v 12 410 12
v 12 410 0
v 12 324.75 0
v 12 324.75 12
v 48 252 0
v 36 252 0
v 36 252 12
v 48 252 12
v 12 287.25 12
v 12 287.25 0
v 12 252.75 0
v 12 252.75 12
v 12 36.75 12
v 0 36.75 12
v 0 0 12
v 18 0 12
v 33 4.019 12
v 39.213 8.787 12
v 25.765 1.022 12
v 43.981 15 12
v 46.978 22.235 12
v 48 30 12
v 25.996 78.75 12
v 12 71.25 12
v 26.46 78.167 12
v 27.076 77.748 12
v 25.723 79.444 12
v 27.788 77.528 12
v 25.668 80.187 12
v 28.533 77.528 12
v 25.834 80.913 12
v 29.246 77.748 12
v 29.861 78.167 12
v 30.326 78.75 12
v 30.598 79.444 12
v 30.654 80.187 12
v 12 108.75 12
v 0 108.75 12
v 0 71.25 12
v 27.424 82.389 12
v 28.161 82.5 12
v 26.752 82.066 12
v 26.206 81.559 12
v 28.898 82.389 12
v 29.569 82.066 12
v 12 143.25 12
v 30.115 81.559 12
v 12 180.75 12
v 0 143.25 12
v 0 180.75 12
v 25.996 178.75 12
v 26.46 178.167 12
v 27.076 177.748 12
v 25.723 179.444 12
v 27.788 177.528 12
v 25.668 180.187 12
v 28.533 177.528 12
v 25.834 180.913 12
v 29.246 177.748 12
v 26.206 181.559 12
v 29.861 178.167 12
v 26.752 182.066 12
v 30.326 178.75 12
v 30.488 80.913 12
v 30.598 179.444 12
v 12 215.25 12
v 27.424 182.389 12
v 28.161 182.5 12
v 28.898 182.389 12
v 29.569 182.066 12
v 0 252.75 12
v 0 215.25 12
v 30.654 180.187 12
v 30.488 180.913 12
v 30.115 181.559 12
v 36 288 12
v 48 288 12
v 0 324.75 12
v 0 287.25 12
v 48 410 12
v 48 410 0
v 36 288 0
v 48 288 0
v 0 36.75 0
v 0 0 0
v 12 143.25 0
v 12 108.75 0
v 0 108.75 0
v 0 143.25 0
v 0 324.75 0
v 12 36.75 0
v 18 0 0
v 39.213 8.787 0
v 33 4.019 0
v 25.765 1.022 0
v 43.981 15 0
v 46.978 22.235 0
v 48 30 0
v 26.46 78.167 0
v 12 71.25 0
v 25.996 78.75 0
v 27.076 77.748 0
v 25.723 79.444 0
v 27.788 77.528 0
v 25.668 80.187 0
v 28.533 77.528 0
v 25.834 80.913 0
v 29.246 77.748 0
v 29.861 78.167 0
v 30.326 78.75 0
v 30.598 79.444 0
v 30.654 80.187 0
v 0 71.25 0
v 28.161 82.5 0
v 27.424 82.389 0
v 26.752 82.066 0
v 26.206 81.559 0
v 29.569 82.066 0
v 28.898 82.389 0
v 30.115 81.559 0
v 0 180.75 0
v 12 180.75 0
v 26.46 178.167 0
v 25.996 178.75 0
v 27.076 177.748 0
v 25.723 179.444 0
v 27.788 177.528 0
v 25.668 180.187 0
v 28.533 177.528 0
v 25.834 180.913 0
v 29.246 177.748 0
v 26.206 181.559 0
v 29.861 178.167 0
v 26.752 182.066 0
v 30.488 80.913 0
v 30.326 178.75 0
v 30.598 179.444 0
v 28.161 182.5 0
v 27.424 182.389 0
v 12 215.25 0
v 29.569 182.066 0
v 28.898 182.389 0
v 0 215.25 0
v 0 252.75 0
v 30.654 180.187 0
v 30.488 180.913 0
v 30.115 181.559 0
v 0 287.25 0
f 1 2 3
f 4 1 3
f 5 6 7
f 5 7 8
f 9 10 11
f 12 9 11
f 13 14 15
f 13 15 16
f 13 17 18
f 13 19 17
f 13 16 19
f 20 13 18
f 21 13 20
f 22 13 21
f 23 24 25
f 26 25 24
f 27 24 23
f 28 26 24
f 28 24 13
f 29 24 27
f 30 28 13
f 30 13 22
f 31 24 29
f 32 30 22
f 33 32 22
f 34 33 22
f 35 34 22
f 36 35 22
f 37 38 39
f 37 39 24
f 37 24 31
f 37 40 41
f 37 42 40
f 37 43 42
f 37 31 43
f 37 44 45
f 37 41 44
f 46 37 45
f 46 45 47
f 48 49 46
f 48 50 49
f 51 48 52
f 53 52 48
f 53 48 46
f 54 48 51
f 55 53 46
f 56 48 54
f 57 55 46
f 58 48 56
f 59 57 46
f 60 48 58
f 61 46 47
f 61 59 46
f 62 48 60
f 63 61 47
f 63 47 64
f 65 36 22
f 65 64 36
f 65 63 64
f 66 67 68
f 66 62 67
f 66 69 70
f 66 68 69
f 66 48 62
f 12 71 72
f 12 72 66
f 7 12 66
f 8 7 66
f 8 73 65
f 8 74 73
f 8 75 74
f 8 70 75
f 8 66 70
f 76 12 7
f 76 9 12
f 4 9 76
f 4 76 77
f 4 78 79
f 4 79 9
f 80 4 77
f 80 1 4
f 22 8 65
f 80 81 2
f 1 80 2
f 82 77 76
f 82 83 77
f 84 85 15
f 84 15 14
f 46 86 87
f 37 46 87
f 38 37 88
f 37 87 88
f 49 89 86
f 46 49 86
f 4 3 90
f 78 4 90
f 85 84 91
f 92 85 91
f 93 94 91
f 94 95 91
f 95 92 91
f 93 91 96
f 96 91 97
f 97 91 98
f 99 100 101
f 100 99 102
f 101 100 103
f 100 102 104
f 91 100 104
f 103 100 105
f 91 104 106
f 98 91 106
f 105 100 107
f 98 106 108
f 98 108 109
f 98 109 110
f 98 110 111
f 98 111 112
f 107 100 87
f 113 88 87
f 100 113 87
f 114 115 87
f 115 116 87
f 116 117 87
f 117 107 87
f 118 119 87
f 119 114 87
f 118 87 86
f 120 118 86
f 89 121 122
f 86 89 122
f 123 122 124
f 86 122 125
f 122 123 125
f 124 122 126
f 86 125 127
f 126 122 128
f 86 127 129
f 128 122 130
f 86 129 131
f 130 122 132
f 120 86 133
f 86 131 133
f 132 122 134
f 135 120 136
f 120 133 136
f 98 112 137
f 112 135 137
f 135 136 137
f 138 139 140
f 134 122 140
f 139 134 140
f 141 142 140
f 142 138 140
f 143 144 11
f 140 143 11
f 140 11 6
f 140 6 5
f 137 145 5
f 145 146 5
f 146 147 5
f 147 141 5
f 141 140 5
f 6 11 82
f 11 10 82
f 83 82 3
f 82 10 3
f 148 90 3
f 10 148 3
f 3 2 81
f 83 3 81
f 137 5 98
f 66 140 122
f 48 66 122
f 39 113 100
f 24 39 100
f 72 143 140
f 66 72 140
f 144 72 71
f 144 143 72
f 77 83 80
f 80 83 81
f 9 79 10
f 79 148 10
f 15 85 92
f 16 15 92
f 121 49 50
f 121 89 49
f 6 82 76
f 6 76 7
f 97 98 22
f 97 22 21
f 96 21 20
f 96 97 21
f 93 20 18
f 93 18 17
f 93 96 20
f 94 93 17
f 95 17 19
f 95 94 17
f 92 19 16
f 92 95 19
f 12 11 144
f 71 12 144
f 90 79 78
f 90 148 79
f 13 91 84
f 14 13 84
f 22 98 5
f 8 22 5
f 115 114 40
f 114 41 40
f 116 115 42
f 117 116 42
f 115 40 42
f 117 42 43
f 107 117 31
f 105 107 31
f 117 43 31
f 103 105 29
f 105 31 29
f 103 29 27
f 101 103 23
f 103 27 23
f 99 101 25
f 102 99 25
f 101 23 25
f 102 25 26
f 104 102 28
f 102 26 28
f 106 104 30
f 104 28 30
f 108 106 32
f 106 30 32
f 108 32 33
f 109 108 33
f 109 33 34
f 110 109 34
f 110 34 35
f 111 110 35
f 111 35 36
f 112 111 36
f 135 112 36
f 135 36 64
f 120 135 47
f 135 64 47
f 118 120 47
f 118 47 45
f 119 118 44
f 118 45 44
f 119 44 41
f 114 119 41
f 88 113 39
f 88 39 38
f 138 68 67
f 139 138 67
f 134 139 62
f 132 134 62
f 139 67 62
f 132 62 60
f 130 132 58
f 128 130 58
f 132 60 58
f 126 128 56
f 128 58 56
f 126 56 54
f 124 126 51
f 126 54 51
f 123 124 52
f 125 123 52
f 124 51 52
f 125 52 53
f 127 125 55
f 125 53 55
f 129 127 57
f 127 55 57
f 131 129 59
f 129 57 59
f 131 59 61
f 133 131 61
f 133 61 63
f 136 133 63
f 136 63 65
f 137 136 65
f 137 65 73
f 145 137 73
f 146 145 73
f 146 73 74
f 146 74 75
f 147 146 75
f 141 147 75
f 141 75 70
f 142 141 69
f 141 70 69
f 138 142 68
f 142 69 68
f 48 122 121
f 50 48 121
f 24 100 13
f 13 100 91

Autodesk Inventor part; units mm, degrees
ref_plane "YZ Plane" through (0, 0, 0) normal (1, 0, 0) x (0, 1, 0)
ref_plane "XZ Plane" through (0, 0, 0) normal (0, 1, 0) x (-1, 0, 0)
ref_plane "XY Plane" through (0, 0, 0) normal (0, 0, 1) x (1, 0, 0)
ref_plane "Work Plane1" through (0, 0, 0) normal (0, 0, 1) x (1, 0, 0)
sketch "Sketch1" plane through (0, 0, 0) normal (0, 0, 1) x (1, 0, 0)
  line L0 (12, 534.827) -> (0, 534.827)
  line L1 (0, 534.827) -> (0, 622.3733)
  line L2 (0, 622.3733) -> (12, 622.3733)
  line L3 (12, 622.3733) -> (12, 534.827)
  line L4 (0, 476.4832) -> (12, 476.4832)
  line L5 (12, 476.4832) -> (12, 324)
  line L6 (12, 324) -> (0, 324)
  line L7 (0, 288) -> (0, 324)
  line L8 (0, 288) -> (12, 288)
  line L9 (12, 288) -> (12, 252)
  line L10 (12, 252) -> (0, 252)
  line L11 (0, 216) -> (0, 252)
  line L12 (0, 216) -> (12, 216)
  line L13 (12, 216) -> (12, 180)
  line L14 (12, 180) -> (0, 180)
  line L15 (0, 144) -> (0, 180)
  line L16 (0, 144) -> (12, 144)
  line L17 (12, 144) -> (12, 108)
  line L18 (12, 108) -> (0, 108)
  line L19 (0, 72) -> (0, 108)
  line L20 (0, 72) -> (12, 72)
  line L21 (12, 72) -> (12, 36)
  line L22 (12, 36) -> (0, 36)
  line L23 (0, 0) -> (0, 36)
  line L24 (12, 0) -> (0, 0)
  line L25 (12, 36) -> (12, 0)
  line L26 (0, 324) -> (0, 476.4832)
  line L27 (12, 324) -> (12, 288)
  line L28 (0, 252) -> (0, 288)
  line L29 (12, 252) -> (12, 216)
  line L30 (0, 180) -> (0, 216)
  line L31 (12, 180) -> (12, 144)
  line L32 (0, 108) -> (0, 144)
  line L33 (12, 108) -> (12, 72)
  line L34 (0, 36) -> (0, 72)
  line L35 (12, 0) -> (18, 0)
  line L36 (48, 30) -> (48, 410)
  line L37 (48, 410) -> (12, 410)
  line L38 (12, 410) -> (12, 0)
  arc A0 (18, 0) -> (48, 30) centre (18, 30) ccw
  point P0 (48, 0)
  dimension "d0" = 36
  dimension "d1" = 410
  dimension "d34" = 30
extrude "Extrusion1" add sketch "Sketch1" along normal blind 12 contours L6 L27 L8 L7 | L37 L36 A0 L35 L25 L21 L33 L17 L31 L13 L29 L9 L27 L5 | L10 L29 L12 L11 | L14 L31 L16 L15 | L24 L23 L22 L25 | L18 L33 L20 L19
sketch "Sketch2" plane through (0, 481.1893, 141.342) normal (0, -0.8660254, 0.5) x (1, 0, 0)
  line L0 (0, 0) -> (0, 36) projected
  line L1 (0, 0) -> (12, 0) projected
  line L2 (12, 36) -> (12, 0) projected
  line L3 (0, 36) -> (12, 36) projected
  line L4 (0, -72) -> (0, -36) projected
  line L5 (0, -72) -> (12, -72) projected
  line L6 (12, -36) -> (12, -72) projected
  line L7 (0, -36) -> (12, -36) projected
  line L8 (0, -144) -> (0, -108) projected
  line L9 (0, -144) -> (12, -144) projected
  line L10 (12, -108) -> (12, -144) projected
  line L11 (0, -108) -> (12, -108) projected
  line L12 (48, -147.6081) -> (12, -147.6081) projected
  line L13 (12, 36) -> (624, 36)
  line L14 (624, 36) -> (624, -164)
  line L15 (624, -164) -> (12, -164)
  line L16 (12, -164) -> (12, 36)
  line L17 (318, -164) -> (318, 36) construction
  line L18 (636, 0) -> (636, 36)
  line L19 (636, 0) -> (624, 0)
  line L20 (624, 36) -> (624, 0)
  line L21 (636, 36) -> (624, 36)
  line L22 (636, -72) -> (636, -36)
  line L23 (636, -72) -> (624, -72)
  line L24 (624, -36) -> (624, -72)
  line L25 (636, -36) -> (624, -36)
  line L26 (636, -144) -> (636, -108)
  line L27 (636, -144) -> (624, -144)
  line L28 (624, -108) -> (624, -144)
  line L29 (636, -108) -> (624, -108)
  line L30 (588, -147.6081) -> (624, -147.6081)
  line L31 (624, -164) -> (624, 36)
  line L32 (12, 36) -> (48, 36)
  line L33 (48, 36) -> (48, 24)
  line L34 (48, 24) -> (12, 24)
  line L35 (12, 24) -> (12, 36)
  line L36 (84, 24) -> (48, 24)
  line L37 (84, 36) -> (84, 24)
  line L38 (48, 36) -> (84, 36)
  line L39 (48, 24) -> (48, 36)
  line L40 (120, 24) -> (84, 24)
  line L41 (120, 36) -> (120, 24)
  line L42 (84, 36) -> (120, 36)
  line L43 (84, 24) -> (84, 36)
  line L44 (156, 24) -> (120, 24)
  line L45 (156, 36) -> (156, 24)
  line L46 (120, 36) -> (156, 36)
  line L47 (120, 24) -> (120, 36)
  line L48 (192, 24) -> (156, 24)
  line L49 (192, 36) -> (192, 24)
  line L50 (156, 36) -> (192, 36)
  line L51 (156, 24) -> (156, 36)
  line L52 (228, 24) -> (192, 24)
  line L53 (228, 36) -> (228, 24)
  line L54 (192, 36) -> (228, 36)
  line L55 (192, 24) -> (192, 36)
  line L56 (264, 24) -> (228, 24)
  line L57 (264, 36) -> (264, 24)
  line L58 (228, 36) -> (264, 36)
  line L59 (228, 24) -> (228, 36)
  line L60 (300, 24) -> (264, 24)
  line L61 (300, 36) -> (300, 24)
  line L62 (264, 36) -> (300, 36)
  line L63 (264, 24) -> (264, 36)
  line L64 (336, 24) -> (300, 24)
  line L65 (336, 36) -> (336, 24)
  line L66 (300, 36) -> (336, 36)
  line L67 (300, 24) -> (300, 36)
  line L68 (372, 24) -> (336, 24)
  line L69 (372, 36) -> (372, 24)
  line L70 (336, 36) -> (372, 36)
  line L71 (336, 24) -> (336, 36)
  line L72 (408, 24) -> (372, 24)
  line L73 (408, 36) -> (408, 24)
  line L74 (372, 36) -> (408, 36)
  line L75 (372, 24) -> (372, 36)
  line L76 (444, 24) -> (408, 24)
  line L77 (444, 36) -> (444, 24)
  line L78 (408, 36) -> (444, 36)
  line L79 (408, 24) -> (408, 36)
  line L80 (480, 24) -> (444, 24)
  line L81 (480, 36) -> (480, 24)
  line L82 (444, 36) -> (480, 36)
  line L83 (444, 24) -> (444, 36)
  line L84 (516, 24) -> (480, 24)
  line L85 (516, 36) -> (516, 24)
  line L86 (480, 36) -> (516, 36)
  line L87 (480, 24) -> (480, 36)
  line L88 (552, 24) -> (516, 24)
  line L89 (552, 36) -> (552, 24)
  line L90 (516, 36) -> (552, 36)
  line L91 (516, 24) -> (516, 36)
  line L92 (588, 24) -> (552, 24)
  line L93 (588, 36) -> (588, 24)
  line L94 (552, 36) -> (588, 36)
  line L95 (552, 24) -> (552, 36)
  line L96 (624, 24) -> (588, 24)
  line L97 (624, 36) -> (624, 24)
  line L98 (588, 36) -> (624, 36)
  line L99 (588, 24) -> (588, 36)
  line L100 (660, 24) -> (624, 24)
  line L101 (660, 36) -> (660, 24)
  line L102 (624, 36) -> (660, 36)
  line L103 (624, 24) -> (624, 36)
  line L104 (696, 24) -> (660, 24)
  line L105 (696, 36) -> (696, 24)
  line L106 (660, 36) -> (696, 36)
  line L107 (660, 24) -> (660, 36)
  line L108 (732, 24) -> (696, 24)
  line L109 (732, 36) -> (732, 24)
  line L110 (696, 36) -> (732, 36)
  line L111 (696, 24) -> (696, 36)
  line L112 (12, -64) -> (624, -64) construction
  line L113 (12, -164) -> (12, -128)
  line L114 (12, -164) -> (624, -164)
  line L115 (12, -164) -> (48, -164)
  line L116 (48, -164) -> (48, -152)
  line L117 (48, -152) -> (12, -152)
  line L118 (12, -152) -> (12, -164)
  line L119 (84, -152) -> (48, -152)
  line L120 (84, -164) -> (84, -152)
  line L121 (48, -164) -> (84, -164)
  line L122 (48, -152) -> (48, -164)
  line L123 (120, -152) -> (84, -152)
  line L124 (120, -164) -> (120, -152)
  line L125 (84, -164) -> (120, -164)
  line L126 (84, -152) -> (84, -164)
  line L127 (156, -152) -> (120, -152)
  line L128 (156, -164) -> (156, -152)
  line L129 (120, -164) -> (156, -164)
  line L130 (120, -152) -> (120, -164)
  line L131 (192, -152) -> (156, -152)
  line L132 (192, -164) -> (192, -152)
  line L133 (156, -164) -> (192, -164)
  line L134 (156, -152) -> (156, -164)
  line L135 (228, -152) -> (192, -152)
  line L136 (228, -164) -> (228, -152)
  line L137 (192, -164) -> (228, -164)
  line L138 (192, -152) -> (192, -164)
  line L139 (264, -152) -> (228, -152)
  line L140 (264, -164) -> (264, -152)
  line L141 (228, -164) -> (264, -164)
  line L142 (228, -152) -> (228, -164)
  line L143 (300, -152) -> (264, -152)
  line L144 (300, -164) -> (300, -152)
  line L145 (264, -164) -> (300, -164)
  line L146 (264, -152) -> (264, -164)
  line L147 (336, -152) -> (300, -152)
  line L148 (336, -164) -> (336, -152)
  line L149 (300, -164) -> (336, -164)
  line L150 (300, -152) -> (300, -164)
  line L151 (372, -152) -> (336, -152)
  line L152 (372, -164) -> (372, -152)
  line L153 (336, -164) -> (372, -164)
  line L154 (336, -152) -> (336, -164)
  line L155 (408, -152) -> (372, -152)
  line L156 (408, -164) -> (408, -152)
  line L157 (372, -164) -> (408, -164)
  line L158 (372, -152) -> (372, -164)
  line L159 (444, -152) -> (408, -152)
  line L160 (444, -164) -> (444, -152)
  line L161 (408, -164) -> (444, -164)
  line L162 (408, -152) -> (408, -164)
  line L163 (480, -152) -> (444, -152)
  line L164 (480, -164) -> (480, -152)
  line L165 (444, -164) -> (480, -164)
  line L166 (444, -152) -> (444, -164)
  line L167 (516, -152) -> (480, -152)
  line L168 (516, -164) -> (516, -152)
  line L169 (480, -164) -> (516, -164)
  line L170 (480, -152) -> (480, -164)
  line L171 (552, -152) -> (516, -152)
  line L172 (552, -164) -> (552, -152)
  line L173 (516, -164) -> (552, -164)
  line L174 (516, -152) -> (516, -164)
  line L175 (588, -152) -> (552, -152)
  line L176 (588, -164) -> (588, -152)
  line L177 (552, -164) -> (588, -164)
  line L178 (552, -152) -> (552, -164)
  line L179 (624, -152) -> (588, -152)
  line L180 (624, -164) -> (624, -152)
  line L181 (588, -164) -> (624, -164)
  line L182 (588, -152) -> (588, -164)
  line L183 (624, -152) -> (624, -164)
  circle A0 centre (318, -64) radius 2.5
  circle A1 centre (218, -64) radius 2.5
  circle A2 centre (118, -64) radius 2.5
  line L184 (624, -64) -> (12, -64) construction
  circle A3 centre (318, -64) radius 2.5
  circle A4 centre (418, -64) radius 2.5
  circle A5 centre (518, -64) radius 2.5
  circle A6 centre (168, -14) radius 2.5
  circle A7 centre (268, -14) radius 2.5
  circle A8 centre (468, -14) radius 2.5
  circle A9 centre (368, -14) radius 2.5
  line L185 (318, 36) -> (318, -164) construction
  circle A10 centre (168, -114) radius 2.5
  circle A11 centre (268, -114) radius 2.5
  circle A12 centre (468, -114) radius 2.5
  circle A13 centre (368, -114) radius 2.5
  point P0 (0, -363.0004)
  point P1 (48, 24)
  point P2 (12, 0)
  point P3 (12, -72)
  point P4 (12, -108)
  point P5 (12, -144)
  point P6 (12, -152)
  point P7 (48, -164)
  point P8 (84, -164)
  point P9 (84, -152)
  point P10 (120, -164)
  point P11 (156, -164)
  point P12 (156, -152)
  point P13 (192, -164)
  point P14 (228, -164)
  point P15 (228, -152)
  point P16 (264, -164)
  point P17 (300, -164)
  point P18 (300, -152)
  point P19 (336, -164)
  point P20 (372, -164)
  point P21 (372, -152)
  point P22 (408, -164)
  point P23 (444, -164)
  point P24 (444, -152)
  point P25 (480, -164)
  point P26 (516, -164)
  point P27 (516, -152)
  point P28 (552, -164)
  point P29 (588, -164)
  point P30 (624, -144)
  point P31 (624, -108)
  point P32 (624, -72)
  point P33 (624, -36)
  point P34 (624, 0)
  point P35 (552, 24)
  point P36 (552, 36)
  point P37 (516, 36)
  point P38 (480, 24)
  point P39 (480, 36)
  point P40 (444, 36)
  point P41 (408, 36)
  point P42 (372, 36)
  point P43 (336, 24)
  point P44 (336, 36)
  point P45 (300, 36)
  point P46 (264, 24)
  point P47 (264, 36)
  point P48 (228, 36)
  point P49 (192, 24)
  point P50 (192, 36)
  point P51 (156, 36)
  point P52 (120, 24)
  point P53 (120, 36)
  point P54 (84, 36)
  dimension "d4" = 612
  dimension "d5" = 200
  dimension "d6" = 12
  dimension "d7" = 36
  dimension "d10" = 36
  dimension "d21" = 5
  dimension "d24" = 100
  dimension "d29" = 5
  dimension "d30" = 5
  dimension "d31" = 100
  dimension "d32" = 50
  dimension "d33" = 50
sketch "Sketch3" plane through (0, 470.797, 147.342) normal (0, -0.8660254, 0.5) x (1, 0, 0)
  line L0 (588, -164) -> (588, -152) projected
  line L1 (588, -152) -> (624, -152) projected
  line L2 (624, -152) -> (624, -144) projected
  line L3 (624, -144) -> (636, -144) projected
  line L4 (636, -144) -> (636, -108) projected
  line L5 (636, -108) -> (624, -108) projected
  line L6 (624, -108) -> (624, -72) projected
  line L7 (624, -72) -> (636, -72) projected
  line L8 (636, -72) -> (636, -36) projected
  line L9 (636, -36) -> (624, -36) projected
  line L10 (624, -36) -> (624, 0) projected
  line L11 (624, 0) -> (636, 0) projected
  line L12 (636, 0) -> (636, 36) projected
  line L13 (636, 36) -> (588, 36) projected
  line L14 (588, 36) -> (588, 24) projected
  line L15 (588, 24) -> (552, 24) projected
  line L16 (552, 24) -> (552, 36) projected
  line L17 (552, 36) -> (516, 36) projected
  line L18 (516, 36) -> (516, 24) projected
  line L19 (516, 24) -> (480, 24) projected
  line L20 (480, 24) -> (480, 36) projected
  line L21 (264, 36) -> (156, 36) projected
  line L22 (480, 36) -> (372, 36) projected
  line L23 (372, 36) -> (372, 24) projected
  line L24 (372, 24) -> (336, 24) projected
  line L25 (336, 24) -> (336, 36) projected
  line L26 (336, 36) -> (300, 36) projected
  line L27 (300, 36) -> (300, 24) projected
  line L28 (300, 24) -> (264, 24) projected
  line L29 (264, 24) -> (264, 36) projected
  line L30 (156, 36) -> (156, 24) projected
  line L31 (156, 24) -> (120, 24) projected
  line L32 (120, 24) -> (120, 36) projected
  line L33 (120, 36) -> (84, 36) projected
  line L34 (84, 36) -> (84, 24) projected
  line L35 (84, 24) -> (48, 24) projected
  line L36 (48, 24) -> (48, 36) projected
  line L37 (48, 36) -> (0, 36) projected
  line L38 (0, 36) -> (0, 0) projected
  line L39 (0, 0) -> (12, 0) projected
  line L40 (12, 0) -> (12, -36) projected
  line L41 (12, -36) -> (0, -36) projected
  line L42 (0, -36) -> (0, -72) projected
  line L43 (0, -72) -> (12, -72) projected
  line L44 (12, -72) -> (12, -108) projected
  line L45 (12, -108) -> (0, -108) projected
  line L46 (0, -108) -> (0, -144) projected
  line L47 (0, -144) -> (12, -144) projected
  line L48 (12, -144) -> (12, -152) projected
  line L49 (12, -152) -> (48, -152) projected
  line L50 (48, -152) -> (48, -156.2795) projected
  line L51 (48, -164) -> (84, -164) projected
  line L52 (84, -164) -> (84, -152) projected
  line L53 (84, -152) -> (120, -152) projected
  line L54 (120, -152) -> (120, -164) projected
  line L55 (120, -164) -> (156, -164) projected
  line L56 (156, -164) -> (156, -152) projected
  line L57 (156, -152) -> (192, -152) projected
  line L58 (192, -152) -> (192, -164) projected
  line L59 (192, -164) -> (228, -164) projected
  line L60 (228, -164) -> (228, -152) projected
  line L61 (228, -152) -> (264, -152) projected
  line L62 (264, -152) -> (264, -164) projected
  line L63 (264, -164) -> (300, -164) projected
  line L64 (300, -164) -> (300, -152) projected
  line L65 (300, -152) -> (336, -152) projected
  line L66 (336, -152) -> (336, -164) projected
  line L67 (336, -164) -> (372, -164) projected
  line L68 (372, -164) -> (372, -152) projected
  line L69 (372, -152) -> (408, -152) projected
  line L70 (408, -152) -> (408, -164) projected
  line L71 (408, -164) -> (444, -164) projected
  line L72 (444, -164) -> (444, -152) projected
  line L73 (444, -152) -> (480, -152) projected
  line L74 (480, -152) -> (480, -164) projected
  line L75 (480, -164) -> (516, -164) projected
  line L76 (516, -164) -> (516, -152) projected
  line L77 (516, -152) -> (552, -152) projected
  line L78 (552, -152) -> (552, -164) projected
  line L79 (552, -164) -> (588, -164) projected
  line L80 (156, 36) -> (167.3747, 64.5218)
  line L81 (213.8176, 96) -> (422.1824, 96)
  line L82 (468.6253, 64.5218) -> (480, 36)
  arc A0 (213.8176, 96) -> (167.3747, 64.5218) centre (213.8176, 46) ccw
  arc A1 (468.6253, 64.5218) -> (422.1824, 96) centre (422.1824, 46) ccw
  line L83 (336, 36) -> (300, 36) projected
  line L84 (156, 36) -> (480, 36)
  line L85 (48, -164) -> (48, -156.2795) projected
  point P0 (0, -363.0004)
  point P1 (300, 36)
  point P2 (336, 36)
  point P3 (264, 36)
  point P4 (372, 36)
  point P5 (300, 36)
  point P6 (264, 36)
  point P7 (264, 36)
  dimension "d17" = 50
  dimension "d20" = 60
move faces "Move1" translate (0, 0.75, 0) faces at (8, 36, 4) (8, 108, 4) (8, 180, 4) (8, 252, 4) (8, 324, 4)
move faces "Move2" translate (0, -0.75, 0) faces at (4, 288, 4) (4, 216, 4) (4, 144, 4) (4, 72, 4)
sketch "Sketch5" plane through (0, 0, 12) normal (0, 0, 1) x (1, 0, 0)
  line L0 (0, 0) -> (18, 0) projected
  arc A0 (18, 0) -> (48, 30) centre (18, 30) ccw projected
  line L1 (48, 30) -> (48, 410) projected
  line L2 (48, 410) -> (12, 410) projected
  line L3 (12, 410) -> (12, 324.75) projected
  line L4 (12, 324.75) -> (0, 324.75) projected
  line L5 (0, 324.75) -> (0, 287.25) projected
  line L6 (0, 287.25) -> (12, 287.25) projected
  line L7 (12, 287.25) -> (12, 252.75) projected
  line L8 (12, 252.75) -> (0, 252.75) projected
  line L9 (0, 252.75) -> (0, 215.25) projected
  line L10 (0, 215.25) -> (12, 215.25) projected
  line L11 (12, 215.25) -> (12, 180.75) projected
  line L12 (12, 180.75) -> (0, 180.75) projected
  line L13 (0, 180.75) -> (0, 143.25) projected
  line L14 (0, 143.25) -> (12, 143.25) projected
  line L15 (12, 143.25) -> (12, 108.75) projected
  line L16 (12, 108.75) -> (0, 108.75) projected
  line L17 (0, 108.75) -> (0, 71.25) projected
  line L18 (0, 71.25) -> (12, 71.25) projected
  line L19 (12, 71.25) -> (12, 36.75) projected
  line L20 (12, 36.75) -> (0, 36.75) projected
  line L21 (0, 36.75) -> (0, 0) projected
sketch "Sketch6" plane through (0, 0, 0) normal (0, 0, -1) x (-1, 0, 0)
  line L0 (-48, 410) -> (-36, 410)
  line L1 (-36, 410) -> (-36, 288)
  line L2 (-48, 288) -> (-36, 288)
  line L3 (-48, 252) -> (-48, 288)
  line L4 (-36, 252) -> (-48, 252)
  line L5 (-36, 288) -> (-36, 252)
  line L6 (-48, 288) -> (-48, 410)
  point P0 (0, 0)
extrude "Extrusion4" cut sketch "Sketch6" against normal through all contours L2 L5 L4 L3
sketch "Sketch7" plane through (0, 0, 0) normal (0, 0, -1) x (-1, 0, 0)
  line L0 (0, 146.4051) -> (0, 106.4051)
  line L1 (0, 0) -> (-18, 0) projected
  point P0 (-28.1608, 80)
  point P1 (-28.1608, 180)
  point P2 (-28.1608, 280)
  dimension "d43" = 80
  dimension "d44" = 100
  dimension "d45" = 100
hole "Hole1" at (28.1608, 180, 0) at (28.1608, 80, 0) direction (0, 0, 1) diameter 5 end through all
sketch "Sketch8" plane through (0, 0, 12) normal (0, 0, 1) x (1, 0, 0)
  circle A0 centre (28.1608, 180) radius 2.5 projected
  circle A1 centre (28.1608, 80) radius 2.5 projected
  line L0 (48, 252) -> (36, 252) projected
  line L1 (36, 252) -> (36, 288) projected
  line L2 (36, 288) -> (48, 288) projected
  line L3 (48, 288) -> (48, 410) projected
  line L4 (48, 410) -> (12, 410) projected
  line L5 (12, 410) -> (12, 324.75) projected
  line L6 (12, 324.75) -> (0, 324.75) projected
  line L7 (0, 324.75) -> (0, 287.25) projected
  line L8 (0, 287.25) -> (12, 287.25) projected
  line L9 (12, 287.25) -> (12, 252.75) projected
  line L10 (12, 252.75) -> (0, 252.75) projected
  line L11 (0, 252.75) -> (0, 215.25) projected
  line L12 (0, 215.25) -> (12, 215.25) projected
  line L13 (12, 215.25) -> (12, 180.75) projected
  line L14 (12, 180.75) -> (0, 180.75) projected
  line L15 (0, 180.75) -> (0, 143.25) projected
  line L16 (0, 143.25) -> (12, 143.25) projected
  line L17 (12, 143.25) -> (12, 108.75) projected
  line L18 (12, 108.75) -> (0, 108.75) projected
  line L19 (0, 108.75) -> (0, 71.25) projected
  line L20 (0, 71.25) -> (12, 71.25) projected
  line L21 (12, 71.25) -> (12, 36.75) projected
  line L22 (12, 36.75) -> (0, 36.75) projected
  line L23 (0, 36.75) -> (0, 0) projected
  line L24 (0, 0) -> (18, 0) projected
  arc A2 (18, 0) -> (48, 30) centre (18, 30) ccw projected
  line L25 (48, 30) -> (48, 252) projected
sketch "Sketch9" plane through (0, 0, 0) normal (0, 0, -1) x (-1, 0, 0)
  circle A0 centre (-28.1608, 180) radius 2.5 projected
  circle A1 centre (-28.1608, 80) radius 2.5 projected
  line L0 (-36, 252) -> (-48, 252) projected
  line L1 (-48, 30) -> (-48, 252) projected
  arc A2 (-48, 30) -> (-18, 0) centre (-18, 30) ccw projected
  line L2 (0, 0) -> (-18, 0) projected
  line L3 (0, 36.75) -> (0, 0) projected
  line L4 (-12, 36.75) -> (0, 36.75) projected
  line L5 (-12, 71.25) -> (-12, 36.75) projected
  line L6 (0, 71.25) -> (-12, 71.25) projected
  line L7 (0, 108.75) -> (0, 71.25) projected
  line L8 (-12, 108.75) -> (0, 108.75) projected
  line L9 (-12, 143.25) -> (-12, 108.75) projected
  line L10 (0, 143.25) -> (-12, 143.25) projected
  line L11 (0, 180.75) -> (0, 143.25) projected
  line L12 (-12, 180.75) -> (0, 180.75) projected
  line L13 (-12, 215.25) -> (-12, 180.75) projected
  line L14 (0, 215.25) -> (-12, 215.25) projected
  line L15 (0, 252.75) -> (0, 215.25) projected
  line L16 (-12, 252.75) -> (0, 252.75) projected
  line L17 (-12, 287.25) -> (-12, 252.75) projected
  line L18 (0, 287.25) -> (-12, 287.25) projected
  line L19 (0, 324.75) -> (0, 287.25) projected
  line L20 (-12, 324.75) -> (0, 324.75) projected
  line L21 (-12, 410) -> (-12, 324.75) projected
  line L22 (-48, 410) -> (-12, 410) projected
  line L23 (-48, 288) -> (-48, 410) projected
  line L24 (-48, 288) -> (-36, 288) projected
  line L25 (-36, 288) -> (-36, 252) projected
equation "\"d4\" = 17 * d7"
equation "\"d7\" = 3 * d6"
equation "\"d10\" = d7"
equation "\"d31\" = d24"
equation "\"d32\" = 0.5 * d31"
equation "\"d33\" = d32"
equation "\"d45\" = d44"
properties part number "wooden_lip"
